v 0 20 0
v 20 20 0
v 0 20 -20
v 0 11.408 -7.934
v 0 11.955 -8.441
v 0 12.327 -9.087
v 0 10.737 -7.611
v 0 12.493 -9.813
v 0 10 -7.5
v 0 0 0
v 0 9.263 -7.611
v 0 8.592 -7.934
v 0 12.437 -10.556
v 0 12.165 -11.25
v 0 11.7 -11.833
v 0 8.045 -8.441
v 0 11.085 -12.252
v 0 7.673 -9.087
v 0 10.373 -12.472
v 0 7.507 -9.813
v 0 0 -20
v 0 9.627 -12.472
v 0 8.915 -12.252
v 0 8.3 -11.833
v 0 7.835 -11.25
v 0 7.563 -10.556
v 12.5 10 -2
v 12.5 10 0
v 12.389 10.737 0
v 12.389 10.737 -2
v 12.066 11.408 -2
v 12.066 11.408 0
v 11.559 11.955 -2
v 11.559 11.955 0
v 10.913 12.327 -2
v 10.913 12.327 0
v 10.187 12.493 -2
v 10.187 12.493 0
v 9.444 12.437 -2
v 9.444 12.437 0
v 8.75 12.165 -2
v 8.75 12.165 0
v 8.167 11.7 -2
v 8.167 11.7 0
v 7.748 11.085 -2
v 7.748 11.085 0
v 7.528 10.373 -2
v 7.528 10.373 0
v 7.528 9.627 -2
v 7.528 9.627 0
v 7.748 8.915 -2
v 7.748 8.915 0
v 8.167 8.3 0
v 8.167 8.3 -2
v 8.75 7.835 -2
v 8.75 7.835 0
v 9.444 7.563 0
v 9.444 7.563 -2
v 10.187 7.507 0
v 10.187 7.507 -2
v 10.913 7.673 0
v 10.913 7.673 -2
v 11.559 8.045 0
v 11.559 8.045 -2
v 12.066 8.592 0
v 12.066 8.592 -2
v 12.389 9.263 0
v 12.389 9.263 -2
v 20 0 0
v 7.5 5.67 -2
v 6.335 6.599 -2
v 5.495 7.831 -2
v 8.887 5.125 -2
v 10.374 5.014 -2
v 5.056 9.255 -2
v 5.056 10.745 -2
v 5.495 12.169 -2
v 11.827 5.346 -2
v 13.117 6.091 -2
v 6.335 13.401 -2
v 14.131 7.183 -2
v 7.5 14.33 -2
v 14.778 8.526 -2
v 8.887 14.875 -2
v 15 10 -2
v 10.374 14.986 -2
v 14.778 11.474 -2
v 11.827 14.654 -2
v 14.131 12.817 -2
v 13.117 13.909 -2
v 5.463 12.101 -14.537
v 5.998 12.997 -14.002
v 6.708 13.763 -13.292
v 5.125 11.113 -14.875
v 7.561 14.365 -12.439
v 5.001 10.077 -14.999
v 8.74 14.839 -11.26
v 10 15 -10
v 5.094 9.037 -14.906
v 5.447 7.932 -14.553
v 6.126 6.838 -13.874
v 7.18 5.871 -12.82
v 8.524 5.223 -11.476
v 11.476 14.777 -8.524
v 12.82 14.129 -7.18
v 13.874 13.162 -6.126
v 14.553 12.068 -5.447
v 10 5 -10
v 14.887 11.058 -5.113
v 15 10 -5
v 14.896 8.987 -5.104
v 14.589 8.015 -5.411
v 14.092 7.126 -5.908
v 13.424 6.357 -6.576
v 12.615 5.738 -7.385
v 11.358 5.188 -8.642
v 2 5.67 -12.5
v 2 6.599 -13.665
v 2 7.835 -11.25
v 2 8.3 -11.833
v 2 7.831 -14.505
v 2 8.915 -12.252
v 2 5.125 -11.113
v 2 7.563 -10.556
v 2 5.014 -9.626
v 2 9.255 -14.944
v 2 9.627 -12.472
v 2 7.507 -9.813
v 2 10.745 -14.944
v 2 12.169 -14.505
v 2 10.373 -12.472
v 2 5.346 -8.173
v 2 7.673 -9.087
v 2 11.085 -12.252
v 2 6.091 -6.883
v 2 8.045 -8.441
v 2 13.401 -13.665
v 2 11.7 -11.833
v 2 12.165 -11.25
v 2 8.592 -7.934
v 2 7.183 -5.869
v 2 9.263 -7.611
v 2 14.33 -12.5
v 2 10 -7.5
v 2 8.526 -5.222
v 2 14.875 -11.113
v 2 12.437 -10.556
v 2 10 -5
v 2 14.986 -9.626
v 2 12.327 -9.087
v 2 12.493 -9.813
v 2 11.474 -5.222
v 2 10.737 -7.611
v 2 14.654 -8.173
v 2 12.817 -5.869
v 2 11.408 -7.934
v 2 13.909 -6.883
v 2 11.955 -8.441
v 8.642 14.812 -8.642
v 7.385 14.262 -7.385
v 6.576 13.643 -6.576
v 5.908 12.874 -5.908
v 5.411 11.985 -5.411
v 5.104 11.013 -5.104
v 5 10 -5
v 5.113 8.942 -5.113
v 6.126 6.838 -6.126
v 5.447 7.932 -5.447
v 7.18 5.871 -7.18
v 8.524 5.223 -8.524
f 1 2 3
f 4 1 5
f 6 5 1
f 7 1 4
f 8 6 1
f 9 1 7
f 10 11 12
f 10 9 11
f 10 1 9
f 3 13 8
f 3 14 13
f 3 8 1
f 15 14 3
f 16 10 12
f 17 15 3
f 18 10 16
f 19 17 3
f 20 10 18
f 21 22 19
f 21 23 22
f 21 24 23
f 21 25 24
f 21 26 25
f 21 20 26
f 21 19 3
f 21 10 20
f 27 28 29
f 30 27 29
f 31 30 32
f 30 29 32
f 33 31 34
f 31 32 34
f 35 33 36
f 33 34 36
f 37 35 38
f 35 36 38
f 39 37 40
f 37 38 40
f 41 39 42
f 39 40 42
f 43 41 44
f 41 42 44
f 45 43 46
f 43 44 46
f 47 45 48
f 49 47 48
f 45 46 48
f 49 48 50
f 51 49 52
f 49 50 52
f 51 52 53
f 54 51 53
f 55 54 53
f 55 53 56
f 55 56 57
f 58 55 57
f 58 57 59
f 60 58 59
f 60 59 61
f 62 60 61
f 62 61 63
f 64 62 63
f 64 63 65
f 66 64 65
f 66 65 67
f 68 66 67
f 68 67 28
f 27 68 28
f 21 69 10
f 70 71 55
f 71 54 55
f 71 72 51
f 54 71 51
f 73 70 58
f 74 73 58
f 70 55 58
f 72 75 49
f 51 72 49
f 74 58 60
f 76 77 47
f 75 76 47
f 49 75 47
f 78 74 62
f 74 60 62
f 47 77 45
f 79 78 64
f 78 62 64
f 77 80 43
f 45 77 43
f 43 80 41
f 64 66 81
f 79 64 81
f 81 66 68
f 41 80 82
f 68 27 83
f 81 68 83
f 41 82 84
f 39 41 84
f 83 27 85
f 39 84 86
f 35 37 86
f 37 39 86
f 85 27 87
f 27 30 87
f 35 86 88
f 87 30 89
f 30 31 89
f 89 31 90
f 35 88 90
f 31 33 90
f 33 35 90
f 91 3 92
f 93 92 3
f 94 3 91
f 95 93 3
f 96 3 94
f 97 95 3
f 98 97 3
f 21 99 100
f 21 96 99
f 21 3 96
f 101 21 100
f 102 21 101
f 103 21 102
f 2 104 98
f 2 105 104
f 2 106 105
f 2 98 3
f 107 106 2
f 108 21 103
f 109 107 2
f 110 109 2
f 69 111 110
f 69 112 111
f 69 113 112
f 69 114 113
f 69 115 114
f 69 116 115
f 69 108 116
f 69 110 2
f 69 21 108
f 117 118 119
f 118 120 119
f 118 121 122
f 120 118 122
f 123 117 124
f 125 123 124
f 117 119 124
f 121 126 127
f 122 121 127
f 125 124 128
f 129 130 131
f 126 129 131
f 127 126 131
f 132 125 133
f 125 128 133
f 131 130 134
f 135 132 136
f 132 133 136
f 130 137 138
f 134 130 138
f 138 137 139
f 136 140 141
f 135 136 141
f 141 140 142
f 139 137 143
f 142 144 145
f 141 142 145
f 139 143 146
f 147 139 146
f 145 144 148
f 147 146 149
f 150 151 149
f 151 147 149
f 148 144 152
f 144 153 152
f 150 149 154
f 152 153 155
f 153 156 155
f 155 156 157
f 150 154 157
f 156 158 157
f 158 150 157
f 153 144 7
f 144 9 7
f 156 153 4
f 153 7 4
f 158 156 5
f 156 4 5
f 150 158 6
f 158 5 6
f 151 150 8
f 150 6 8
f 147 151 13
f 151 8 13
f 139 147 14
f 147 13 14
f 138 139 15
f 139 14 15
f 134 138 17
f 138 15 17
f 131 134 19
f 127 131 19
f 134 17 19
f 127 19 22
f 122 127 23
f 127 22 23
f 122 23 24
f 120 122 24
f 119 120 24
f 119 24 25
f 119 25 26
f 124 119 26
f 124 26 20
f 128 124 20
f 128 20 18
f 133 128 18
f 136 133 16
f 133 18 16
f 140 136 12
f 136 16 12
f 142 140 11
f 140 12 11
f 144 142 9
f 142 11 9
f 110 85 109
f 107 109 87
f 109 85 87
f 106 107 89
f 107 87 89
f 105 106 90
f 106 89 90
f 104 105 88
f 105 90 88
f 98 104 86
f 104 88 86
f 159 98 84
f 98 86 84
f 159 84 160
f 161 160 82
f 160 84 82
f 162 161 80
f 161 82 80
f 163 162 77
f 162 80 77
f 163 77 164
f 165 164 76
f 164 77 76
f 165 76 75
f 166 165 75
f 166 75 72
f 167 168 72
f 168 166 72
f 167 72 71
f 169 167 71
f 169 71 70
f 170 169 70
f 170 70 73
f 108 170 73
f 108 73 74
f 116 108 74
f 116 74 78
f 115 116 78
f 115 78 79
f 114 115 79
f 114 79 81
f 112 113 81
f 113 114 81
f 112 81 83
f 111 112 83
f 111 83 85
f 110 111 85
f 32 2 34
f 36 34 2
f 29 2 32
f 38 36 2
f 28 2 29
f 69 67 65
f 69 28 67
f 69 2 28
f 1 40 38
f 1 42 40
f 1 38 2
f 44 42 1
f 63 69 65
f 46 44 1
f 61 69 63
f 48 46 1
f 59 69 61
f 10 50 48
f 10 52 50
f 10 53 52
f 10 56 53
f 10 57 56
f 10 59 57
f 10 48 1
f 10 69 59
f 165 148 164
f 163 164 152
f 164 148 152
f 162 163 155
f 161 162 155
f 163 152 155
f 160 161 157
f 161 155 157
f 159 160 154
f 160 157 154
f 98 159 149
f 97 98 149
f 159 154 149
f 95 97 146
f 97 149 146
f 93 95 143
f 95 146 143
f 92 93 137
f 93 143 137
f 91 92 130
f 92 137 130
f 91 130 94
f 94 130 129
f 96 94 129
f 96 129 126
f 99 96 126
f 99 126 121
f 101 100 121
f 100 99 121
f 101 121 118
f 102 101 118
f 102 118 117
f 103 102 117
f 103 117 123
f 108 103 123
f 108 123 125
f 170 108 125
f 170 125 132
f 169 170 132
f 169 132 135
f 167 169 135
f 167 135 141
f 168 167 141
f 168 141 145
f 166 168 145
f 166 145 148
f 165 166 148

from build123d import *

# Parameters (mm, degrees)
BOSS_EXTRUDE1_DEPTH = 20
SKETCH2_R           = 2.5
CUT_EXTRUDE1_DEPTH  = 21
SKETCH3_R           = 2.5
CUT_EXTRUDE2_DEPTH  = 21
CUT_EXTRUDE3_START  = -2
SKETCH4_R           = 5
CUT_EXTRUDE3_DEPTH  = 19
CUT_EXTRUDE4_START  = -2
SKETCH5_R           = 5
CUT_EXTRUDE4_DEPTH  = 20


with BuildPart() as part:
    # Sketch1 → Boss-Extrude1 (new body)
    with BuildSketch(Plane(origin=(0, 0, 0), x_dir=(1, 0, 0), z_dir=(0, 1, 0))):
        Polygon((0, 0), (0, 20), (20, 0), align=None)
    extrude(amount=BOSS_EXTRUDE1_DEPTH)

    # Sketch2 → Cut-Extrude1 (cut, through all)
    with BuildSketch(Plane.XY):
        with Locations((10, 10)):
            Circle(SKETCH2_R)
    extrude(amount=-CUT_EXTRUDE1_DEPTH, mode=Mode.SUBTRACT)

    # Sketch3 → Cut-Extrude2 (cut, through all)
    with BuildSketch(Plane.ZY):
        with Locations((-10, 10)):
            Circle(SKETCH3_R)
    extrude(amount=-CUT_EXTRUDE2_DEPTH, mode=Mode.SUBTRACT)

    # Sketch4 → Cut-Extrude3 (cut, through all)
    with BuildSketch(Plane.ZY.offset(CUT_EXTRUDE3_START)):
        with Locations((-10, 10)):
            Circle(SKETCH4_R)
    extrude(amount=-CUT_EXTRUDE3_DEPTH, mode=Mode.SUBTRACT)

    # Sketch5 → Cut-Extrude4 (cut)
    with BuildSketch(Plane.XY.offset(CUT_EXTRUDE4_START)):
        with Locations((10, 10)):
            Circle(SKETCH5_R)
    extrude(amount=-CUT_EXTRUDE4_DEPTH, mode=Mode.SUBTRACT)


solid = part.part
